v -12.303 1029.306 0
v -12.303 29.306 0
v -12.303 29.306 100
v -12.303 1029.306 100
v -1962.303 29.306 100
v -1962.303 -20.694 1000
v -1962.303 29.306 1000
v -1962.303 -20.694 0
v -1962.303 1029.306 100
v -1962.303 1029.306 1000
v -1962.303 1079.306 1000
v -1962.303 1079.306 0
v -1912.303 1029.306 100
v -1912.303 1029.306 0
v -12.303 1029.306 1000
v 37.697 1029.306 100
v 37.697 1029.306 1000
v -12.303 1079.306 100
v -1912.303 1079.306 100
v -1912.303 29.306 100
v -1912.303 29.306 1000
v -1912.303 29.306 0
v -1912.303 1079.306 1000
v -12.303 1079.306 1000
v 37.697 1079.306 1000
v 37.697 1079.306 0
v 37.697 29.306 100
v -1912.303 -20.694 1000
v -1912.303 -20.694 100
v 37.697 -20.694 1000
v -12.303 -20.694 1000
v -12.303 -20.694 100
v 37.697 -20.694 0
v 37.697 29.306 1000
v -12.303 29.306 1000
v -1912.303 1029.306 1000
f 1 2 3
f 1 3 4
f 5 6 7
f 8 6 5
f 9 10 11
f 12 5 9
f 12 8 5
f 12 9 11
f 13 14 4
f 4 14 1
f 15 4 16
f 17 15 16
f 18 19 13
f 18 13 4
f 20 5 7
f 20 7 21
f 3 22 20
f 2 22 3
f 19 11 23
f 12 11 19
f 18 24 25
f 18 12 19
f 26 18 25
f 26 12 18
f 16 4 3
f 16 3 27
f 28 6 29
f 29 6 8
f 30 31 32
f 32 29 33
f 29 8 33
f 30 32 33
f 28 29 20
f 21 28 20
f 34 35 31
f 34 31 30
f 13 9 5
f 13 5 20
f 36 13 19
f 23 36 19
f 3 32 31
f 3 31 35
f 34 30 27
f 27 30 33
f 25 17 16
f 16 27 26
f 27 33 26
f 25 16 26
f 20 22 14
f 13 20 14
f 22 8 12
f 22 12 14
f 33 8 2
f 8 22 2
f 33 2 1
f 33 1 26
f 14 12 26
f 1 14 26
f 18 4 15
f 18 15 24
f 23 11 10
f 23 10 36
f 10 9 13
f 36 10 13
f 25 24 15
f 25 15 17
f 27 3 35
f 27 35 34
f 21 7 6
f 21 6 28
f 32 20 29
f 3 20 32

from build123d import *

# Parameters (mm, degrees)
F0_W     = 2000
F0_H     = 1100
F0_W_2   = 1900
F0_H_2   = 1000
F1_DEPTH = 100
F2_W     = 50
F2_H     = 50
F3_DEPTH = 900


with BuildPart() as f1:
    # F0 (on Top) → F1 (new body)
    with BuildSketch(Plane.XY):
        with Locations((-962.302912, 529.305752)):
            Rectangle(F0_W, F0_H)
        with Locations((-962.302912, 529.305752)):
            Rectangle(F0_W_2, F0_H_2, mode=Mode.SUBTRACT)
    extrude(amount=F1_DEPTH)

    # F2 (on face) → F3 (join)
    with BuildSketch(Plane.XY.offset(100)):
        with Locations((-1937.302912, 4.305752)):
            Rectangle(F2_W, F2_H)
        with Locations((12.697088, 4.305752)):
            Rectangle(F2_W, F2_H)
        with Locations((12.697088, 1054.305752)):
            Rectangle(F2_W, F2_H)
        with Locations((-1937.302912, 1054.305752)):
            Rectangle(F2_W, F2_H)
    extrude(amount=F3_DEPTH)


solid = f1.part
